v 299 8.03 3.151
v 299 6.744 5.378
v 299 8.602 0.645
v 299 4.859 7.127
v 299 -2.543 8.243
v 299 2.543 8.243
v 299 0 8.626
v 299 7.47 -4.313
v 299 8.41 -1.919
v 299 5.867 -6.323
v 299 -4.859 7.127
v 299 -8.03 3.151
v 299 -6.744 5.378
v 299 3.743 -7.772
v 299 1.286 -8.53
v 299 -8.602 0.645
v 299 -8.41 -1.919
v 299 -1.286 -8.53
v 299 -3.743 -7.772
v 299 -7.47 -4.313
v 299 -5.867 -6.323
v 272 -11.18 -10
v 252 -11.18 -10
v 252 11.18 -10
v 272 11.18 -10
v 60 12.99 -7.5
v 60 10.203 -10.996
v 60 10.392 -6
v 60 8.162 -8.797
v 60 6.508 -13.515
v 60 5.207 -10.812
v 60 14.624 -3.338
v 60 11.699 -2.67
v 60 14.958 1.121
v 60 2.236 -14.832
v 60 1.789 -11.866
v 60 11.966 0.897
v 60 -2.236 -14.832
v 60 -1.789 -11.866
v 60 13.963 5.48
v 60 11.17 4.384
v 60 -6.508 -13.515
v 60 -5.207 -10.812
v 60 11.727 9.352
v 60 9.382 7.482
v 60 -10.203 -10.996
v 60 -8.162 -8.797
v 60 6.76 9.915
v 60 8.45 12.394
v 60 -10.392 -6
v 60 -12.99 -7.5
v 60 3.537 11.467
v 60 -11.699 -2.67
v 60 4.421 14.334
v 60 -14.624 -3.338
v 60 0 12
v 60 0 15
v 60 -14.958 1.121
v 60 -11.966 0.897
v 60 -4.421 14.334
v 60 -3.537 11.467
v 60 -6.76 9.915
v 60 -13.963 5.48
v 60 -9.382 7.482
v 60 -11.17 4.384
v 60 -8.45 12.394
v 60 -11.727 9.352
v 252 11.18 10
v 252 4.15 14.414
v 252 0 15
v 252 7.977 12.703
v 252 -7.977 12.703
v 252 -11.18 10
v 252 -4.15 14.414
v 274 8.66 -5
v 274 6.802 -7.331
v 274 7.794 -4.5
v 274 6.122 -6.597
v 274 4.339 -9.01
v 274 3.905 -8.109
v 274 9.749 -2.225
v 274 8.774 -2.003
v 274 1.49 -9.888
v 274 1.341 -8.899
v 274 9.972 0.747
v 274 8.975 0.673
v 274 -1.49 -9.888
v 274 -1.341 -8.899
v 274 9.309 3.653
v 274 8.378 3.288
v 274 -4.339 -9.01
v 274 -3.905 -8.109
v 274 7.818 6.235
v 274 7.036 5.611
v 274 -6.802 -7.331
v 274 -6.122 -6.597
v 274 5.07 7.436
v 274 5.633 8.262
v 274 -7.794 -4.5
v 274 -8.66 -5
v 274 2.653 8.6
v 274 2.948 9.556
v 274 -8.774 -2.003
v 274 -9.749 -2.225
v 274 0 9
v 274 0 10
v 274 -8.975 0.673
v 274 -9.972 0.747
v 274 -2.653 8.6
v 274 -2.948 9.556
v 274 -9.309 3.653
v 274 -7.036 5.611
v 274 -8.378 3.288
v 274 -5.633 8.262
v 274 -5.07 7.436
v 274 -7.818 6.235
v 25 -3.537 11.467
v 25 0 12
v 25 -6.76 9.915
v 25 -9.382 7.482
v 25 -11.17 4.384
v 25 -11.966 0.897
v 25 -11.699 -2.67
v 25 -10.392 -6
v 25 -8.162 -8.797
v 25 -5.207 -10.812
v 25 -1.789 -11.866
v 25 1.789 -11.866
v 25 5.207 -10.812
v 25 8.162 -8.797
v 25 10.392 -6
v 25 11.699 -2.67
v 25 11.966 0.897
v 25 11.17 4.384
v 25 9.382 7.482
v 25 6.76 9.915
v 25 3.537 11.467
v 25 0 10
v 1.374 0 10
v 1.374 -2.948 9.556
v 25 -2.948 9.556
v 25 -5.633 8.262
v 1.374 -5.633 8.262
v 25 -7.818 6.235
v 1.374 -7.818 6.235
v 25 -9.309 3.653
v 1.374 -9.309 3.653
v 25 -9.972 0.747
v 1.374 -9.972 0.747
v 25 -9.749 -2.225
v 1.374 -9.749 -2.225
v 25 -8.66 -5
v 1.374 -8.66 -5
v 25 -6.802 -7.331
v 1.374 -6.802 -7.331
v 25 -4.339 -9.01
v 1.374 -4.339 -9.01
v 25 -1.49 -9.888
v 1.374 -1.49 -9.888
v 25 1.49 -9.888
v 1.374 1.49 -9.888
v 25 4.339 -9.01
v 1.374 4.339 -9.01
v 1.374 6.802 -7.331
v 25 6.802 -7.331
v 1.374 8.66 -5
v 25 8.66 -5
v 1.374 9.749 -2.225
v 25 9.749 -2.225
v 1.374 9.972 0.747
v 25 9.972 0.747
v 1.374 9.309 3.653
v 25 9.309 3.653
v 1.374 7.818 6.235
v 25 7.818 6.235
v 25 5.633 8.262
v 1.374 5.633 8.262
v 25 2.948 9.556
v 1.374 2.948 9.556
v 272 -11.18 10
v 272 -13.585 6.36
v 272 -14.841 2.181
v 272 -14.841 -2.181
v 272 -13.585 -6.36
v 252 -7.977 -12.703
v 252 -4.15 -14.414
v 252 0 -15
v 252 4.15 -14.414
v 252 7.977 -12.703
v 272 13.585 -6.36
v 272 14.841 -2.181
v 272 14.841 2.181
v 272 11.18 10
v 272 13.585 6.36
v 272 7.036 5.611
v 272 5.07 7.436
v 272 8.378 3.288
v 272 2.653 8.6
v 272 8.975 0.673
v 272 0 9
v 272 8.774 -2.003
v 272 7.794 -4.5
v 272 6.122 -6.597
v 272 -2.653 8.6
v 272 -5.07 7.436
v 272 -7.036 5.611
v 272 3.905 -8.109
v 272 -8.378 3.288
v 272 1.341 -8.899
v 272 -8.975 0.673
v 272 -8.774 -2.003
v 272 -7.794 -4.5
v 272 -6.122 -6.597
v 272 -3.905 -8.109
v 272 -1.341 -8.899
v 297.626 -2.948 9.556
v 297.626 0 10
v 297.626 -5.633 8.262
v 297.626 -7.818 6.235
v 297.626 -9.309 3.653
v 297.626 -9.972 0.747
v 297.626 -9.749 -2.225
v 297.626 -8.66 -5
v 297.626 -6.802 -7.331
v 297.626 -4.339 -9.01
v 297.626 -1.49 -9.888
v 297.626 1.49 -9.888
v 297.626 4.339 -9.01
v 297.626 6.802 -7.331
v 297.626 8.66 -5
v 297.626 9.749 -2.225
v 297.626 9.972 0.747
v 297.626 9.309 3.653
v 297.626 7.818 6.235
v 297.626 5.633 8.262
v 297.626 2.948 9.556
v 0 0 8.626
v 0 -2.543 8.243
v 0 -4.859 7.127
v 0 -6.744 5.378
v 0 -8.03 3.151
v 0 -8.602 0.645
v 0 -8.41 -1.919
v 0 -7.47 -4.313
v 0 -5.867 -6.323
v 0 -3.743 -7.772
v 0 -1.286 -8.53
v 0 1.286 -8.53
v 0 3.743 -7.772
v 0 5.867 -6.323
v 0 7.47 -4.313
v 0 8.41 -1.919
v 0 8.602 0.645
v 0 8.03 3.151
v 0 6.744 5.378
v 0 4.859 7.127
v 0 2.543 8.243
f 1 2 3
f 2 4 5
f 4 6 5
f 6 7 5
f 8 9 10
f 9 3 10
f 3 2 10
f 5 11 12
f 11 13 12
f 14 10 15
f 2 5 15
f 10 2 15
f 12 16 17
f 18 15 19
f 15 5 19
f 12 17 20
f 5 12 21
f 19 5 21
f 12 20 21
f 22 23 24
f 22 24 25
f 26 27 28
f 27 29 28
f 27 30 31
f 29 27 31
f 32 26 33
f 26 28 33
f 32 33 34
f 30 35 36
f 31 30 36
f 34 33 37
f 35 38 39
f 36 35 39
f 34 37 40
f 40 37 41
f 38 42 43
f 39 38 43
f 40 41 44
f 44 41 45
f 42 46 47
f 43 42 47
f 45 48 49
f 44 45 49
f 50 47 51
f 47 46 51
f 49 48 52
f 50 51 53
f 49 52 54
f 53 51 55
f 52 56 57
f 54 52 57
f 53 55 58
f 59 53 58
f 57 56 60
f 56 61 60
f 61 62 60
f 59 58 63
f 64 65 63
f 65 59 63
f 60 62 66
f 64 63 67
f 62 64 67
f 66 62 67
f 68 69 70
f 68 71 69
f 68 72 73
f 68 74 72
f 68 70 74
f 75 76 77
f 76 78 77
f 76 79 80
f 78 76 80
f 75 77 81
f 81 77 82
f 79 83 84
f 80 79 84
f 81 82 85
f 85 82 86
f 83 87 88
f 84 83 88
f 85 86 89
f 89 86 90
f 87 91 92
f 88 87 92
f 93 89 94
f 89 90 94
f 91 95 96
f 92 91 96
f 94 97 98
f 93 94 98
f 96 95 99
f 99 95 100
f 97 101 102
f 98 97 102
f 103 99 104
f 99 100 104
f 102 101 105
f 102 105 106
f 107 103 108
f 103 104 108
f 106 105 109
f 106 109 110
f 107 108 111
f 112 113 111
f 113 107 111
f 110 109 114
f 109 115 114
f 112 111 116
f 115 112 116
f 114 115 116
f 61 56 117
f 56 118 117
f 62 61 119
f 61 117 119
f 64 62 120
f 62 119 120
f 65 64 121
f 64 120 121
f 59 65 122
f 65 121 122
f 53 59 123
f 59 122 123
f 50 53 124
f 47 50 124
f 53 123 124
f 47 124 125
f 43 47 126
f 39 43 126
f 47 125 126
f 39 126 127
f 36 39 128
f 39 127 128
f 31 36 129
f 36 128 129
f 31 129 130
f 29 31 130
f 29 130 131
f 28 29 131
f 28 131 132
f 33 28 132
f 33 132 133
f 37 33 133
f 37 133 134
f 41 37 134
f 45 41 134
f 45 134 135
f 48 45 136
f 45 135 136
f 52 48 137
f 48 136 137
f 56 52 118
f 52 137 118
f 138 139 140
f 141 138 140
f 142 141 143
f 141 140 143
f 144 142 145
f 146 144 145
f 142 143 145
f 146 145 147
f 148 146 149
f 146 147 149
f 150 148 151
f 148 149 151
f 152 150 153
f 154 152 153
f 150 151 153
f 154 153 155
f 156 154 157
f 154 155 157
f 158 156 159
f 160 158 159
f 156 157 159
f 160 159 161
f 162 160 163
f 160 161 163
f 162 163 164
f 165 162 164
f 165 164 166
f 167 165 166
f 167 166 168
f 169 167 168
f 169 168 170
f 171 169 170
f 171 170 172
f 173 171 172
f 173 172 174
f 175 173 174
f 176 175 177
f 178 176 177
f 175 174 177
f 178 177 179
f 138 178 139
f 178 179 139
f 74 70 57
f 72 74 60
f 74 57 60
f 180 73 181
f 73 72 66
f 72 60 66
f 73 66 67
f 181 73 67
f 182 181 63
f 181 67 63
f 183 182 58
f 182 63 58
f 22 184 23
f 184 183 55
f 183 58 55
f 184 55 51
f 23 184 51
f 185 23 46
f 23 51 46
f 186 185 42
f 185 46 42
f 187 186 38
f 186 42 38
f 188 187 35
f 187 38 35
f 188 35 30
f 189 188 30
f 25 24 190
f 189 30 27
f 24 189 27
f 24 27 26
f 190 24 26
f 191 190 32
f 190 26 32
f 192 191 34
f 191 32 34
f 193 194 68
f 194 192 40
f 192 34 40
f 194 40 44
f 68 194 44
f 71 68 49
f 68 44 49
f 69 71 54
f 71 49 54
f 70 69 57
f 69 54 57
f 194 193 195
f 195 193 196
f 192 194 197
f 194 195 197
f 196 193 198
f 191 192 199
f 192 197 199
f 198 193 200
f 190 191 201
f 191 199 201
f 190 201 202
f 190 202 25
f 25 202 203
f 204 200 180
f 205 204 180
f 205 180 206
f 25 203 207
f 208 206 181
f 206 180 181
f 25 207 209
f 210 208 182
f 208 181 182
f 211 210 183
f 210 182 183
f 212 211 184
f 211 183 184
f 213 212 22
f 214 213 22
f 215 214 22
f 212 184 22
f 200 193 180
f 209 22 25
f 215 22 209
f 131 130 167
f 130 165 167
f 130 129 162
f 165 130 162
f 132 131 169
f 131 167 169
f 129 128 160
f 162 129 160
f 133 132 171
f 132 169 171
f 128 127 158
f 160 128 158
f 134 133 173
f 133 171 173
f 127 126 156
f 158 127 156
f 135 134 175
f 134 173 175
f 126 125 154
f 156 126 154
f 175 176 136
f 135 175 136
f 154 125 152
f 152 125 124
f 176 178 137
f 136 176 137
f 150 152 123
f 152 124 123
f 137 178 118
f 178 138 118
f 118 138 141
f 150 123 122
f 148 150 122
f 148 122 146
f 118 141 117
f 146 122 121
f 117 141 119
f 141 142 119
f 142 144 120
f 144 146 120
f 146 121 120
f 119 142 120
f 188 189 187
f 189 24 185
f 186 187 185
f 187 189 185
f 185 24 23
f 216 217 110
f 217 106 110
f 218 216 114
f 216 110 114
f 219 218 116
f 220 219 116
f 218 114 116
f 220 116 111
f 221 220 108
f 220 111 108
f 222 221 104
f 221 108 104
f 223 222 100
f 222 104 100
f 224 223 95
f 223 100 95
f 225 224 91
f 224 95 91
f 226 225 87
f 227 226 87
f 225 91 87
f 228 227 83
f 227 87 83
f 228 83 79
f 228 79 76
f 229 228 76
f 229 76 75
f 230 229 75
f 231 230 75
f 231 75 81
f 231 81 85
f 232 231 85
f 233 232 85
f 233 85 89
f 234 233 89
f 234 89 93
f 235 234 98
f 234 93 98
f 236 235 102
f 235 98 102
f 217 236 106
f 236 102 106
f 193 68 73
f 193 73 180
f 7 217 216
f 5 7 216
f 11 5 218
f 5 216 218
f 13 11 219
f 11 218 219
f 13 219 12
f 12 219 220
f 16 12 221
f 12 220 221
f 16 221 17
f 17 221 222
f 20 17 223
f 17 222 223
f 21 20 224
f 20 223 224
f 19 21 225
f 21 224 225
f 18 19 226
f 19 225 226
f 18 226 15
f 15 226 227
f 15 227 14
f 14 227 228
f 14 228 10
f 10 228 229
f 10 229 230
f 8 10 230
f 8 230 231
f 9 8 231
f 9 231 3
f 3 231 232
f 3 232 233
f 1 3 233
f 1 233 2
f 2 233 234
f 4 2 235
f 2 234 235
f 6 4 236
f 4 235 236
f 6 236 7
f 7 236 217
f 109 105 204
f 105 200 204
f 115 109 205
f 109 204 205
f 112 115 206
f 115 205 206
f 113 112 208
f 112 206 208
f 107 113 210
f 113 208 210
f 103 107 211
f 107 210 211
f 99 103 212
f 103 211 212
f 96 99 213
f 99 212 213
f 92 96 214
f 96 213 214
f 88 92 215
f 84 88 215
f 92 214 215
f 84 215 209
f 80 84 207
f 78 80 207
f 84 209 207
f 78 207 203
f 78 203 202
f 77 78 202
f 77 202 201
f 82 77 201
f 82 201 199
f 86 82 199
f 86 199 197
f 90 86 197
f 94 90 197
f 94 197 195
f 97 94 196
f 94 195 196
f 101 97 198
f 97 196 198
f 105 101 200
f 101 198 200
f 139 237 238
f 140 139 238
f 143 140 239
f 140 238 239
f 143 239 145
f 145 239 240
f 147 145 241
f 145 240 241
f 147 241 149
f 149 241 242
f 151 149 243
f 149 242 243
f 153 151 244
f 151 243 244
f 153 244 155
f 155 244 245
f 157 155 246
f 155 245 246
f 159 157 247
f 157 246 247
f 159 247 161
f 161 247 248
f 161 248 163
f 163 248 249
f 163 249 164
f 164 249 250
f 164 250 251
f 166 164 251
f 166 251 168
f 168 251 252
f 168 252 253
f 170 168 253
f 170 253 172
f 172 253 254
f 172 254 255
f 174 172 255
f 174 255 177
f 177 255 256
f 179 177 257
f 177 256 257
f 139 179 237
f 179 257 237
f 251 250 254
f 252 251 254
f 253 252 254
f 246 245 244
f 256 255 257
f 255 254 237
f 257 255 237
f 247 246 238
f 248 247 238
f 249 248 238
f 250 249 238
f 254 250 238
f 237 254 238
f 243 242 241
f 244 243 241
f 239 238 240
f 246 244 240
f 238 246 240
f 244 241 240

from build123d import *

# Parameters (mm, degrees)
CHAMFER_1_SIZE      = 1.374
SKETCH_2_W          = 22
SKETCH_2_H          = 5
CUT_EXTRUDE_1_DEPTH = 15


with BuildPart() as part:
    # Эскиз1 → Повернуть1 (revolve)
    with BuildSketch(Plane.XY, mode=Mode.PRIVATE) as revolve_1_sk:
        Polygon((0, 0), (299, 0), (299, 10), (274, 10), (274, 9), (272, 9), (272, 15), (60, 15), (60, 12), (25, 12), (25, 10), (0, 10), align=None)
    revolve(revolve_1_sk.sketch.rotate(Axis((-1007.978642663, 0, 0), (1, 0, 0)), 90), axis=Axis((-1007.978642663, 0, 0), (1, 0, 0)))

    # Фаска1
    chamfer_1_edges = [part.edges().sort_by_distance(p)[0] for p in [
        (0, 0, -10),
        (299, 0, -10),
    ]]
    chamfer(chamfer_1_edges, length=CHAMFER_1_SIZE)

    # Эскиз2 → Вырез-Вытянуть1 (cut, symmetric)
    with BuildSketch(Plane(origin=(0, 0, 0), x_dir=(1, 0, 0), z_dir=(0, 1, 0))):
        with Locations((263, 12.5)):
            Rectangle(SKETCH_2_W, SKETCH_2_H)
        with Locations((263, -12.5)):
            Rectangle(SKETCH_2_W, SKETCH_2_H)
    extrude(amount=CUT_EXTRUDE_1_DEPTH, both=True, mode=Mode.SUBTRACT)


solid = part.part
